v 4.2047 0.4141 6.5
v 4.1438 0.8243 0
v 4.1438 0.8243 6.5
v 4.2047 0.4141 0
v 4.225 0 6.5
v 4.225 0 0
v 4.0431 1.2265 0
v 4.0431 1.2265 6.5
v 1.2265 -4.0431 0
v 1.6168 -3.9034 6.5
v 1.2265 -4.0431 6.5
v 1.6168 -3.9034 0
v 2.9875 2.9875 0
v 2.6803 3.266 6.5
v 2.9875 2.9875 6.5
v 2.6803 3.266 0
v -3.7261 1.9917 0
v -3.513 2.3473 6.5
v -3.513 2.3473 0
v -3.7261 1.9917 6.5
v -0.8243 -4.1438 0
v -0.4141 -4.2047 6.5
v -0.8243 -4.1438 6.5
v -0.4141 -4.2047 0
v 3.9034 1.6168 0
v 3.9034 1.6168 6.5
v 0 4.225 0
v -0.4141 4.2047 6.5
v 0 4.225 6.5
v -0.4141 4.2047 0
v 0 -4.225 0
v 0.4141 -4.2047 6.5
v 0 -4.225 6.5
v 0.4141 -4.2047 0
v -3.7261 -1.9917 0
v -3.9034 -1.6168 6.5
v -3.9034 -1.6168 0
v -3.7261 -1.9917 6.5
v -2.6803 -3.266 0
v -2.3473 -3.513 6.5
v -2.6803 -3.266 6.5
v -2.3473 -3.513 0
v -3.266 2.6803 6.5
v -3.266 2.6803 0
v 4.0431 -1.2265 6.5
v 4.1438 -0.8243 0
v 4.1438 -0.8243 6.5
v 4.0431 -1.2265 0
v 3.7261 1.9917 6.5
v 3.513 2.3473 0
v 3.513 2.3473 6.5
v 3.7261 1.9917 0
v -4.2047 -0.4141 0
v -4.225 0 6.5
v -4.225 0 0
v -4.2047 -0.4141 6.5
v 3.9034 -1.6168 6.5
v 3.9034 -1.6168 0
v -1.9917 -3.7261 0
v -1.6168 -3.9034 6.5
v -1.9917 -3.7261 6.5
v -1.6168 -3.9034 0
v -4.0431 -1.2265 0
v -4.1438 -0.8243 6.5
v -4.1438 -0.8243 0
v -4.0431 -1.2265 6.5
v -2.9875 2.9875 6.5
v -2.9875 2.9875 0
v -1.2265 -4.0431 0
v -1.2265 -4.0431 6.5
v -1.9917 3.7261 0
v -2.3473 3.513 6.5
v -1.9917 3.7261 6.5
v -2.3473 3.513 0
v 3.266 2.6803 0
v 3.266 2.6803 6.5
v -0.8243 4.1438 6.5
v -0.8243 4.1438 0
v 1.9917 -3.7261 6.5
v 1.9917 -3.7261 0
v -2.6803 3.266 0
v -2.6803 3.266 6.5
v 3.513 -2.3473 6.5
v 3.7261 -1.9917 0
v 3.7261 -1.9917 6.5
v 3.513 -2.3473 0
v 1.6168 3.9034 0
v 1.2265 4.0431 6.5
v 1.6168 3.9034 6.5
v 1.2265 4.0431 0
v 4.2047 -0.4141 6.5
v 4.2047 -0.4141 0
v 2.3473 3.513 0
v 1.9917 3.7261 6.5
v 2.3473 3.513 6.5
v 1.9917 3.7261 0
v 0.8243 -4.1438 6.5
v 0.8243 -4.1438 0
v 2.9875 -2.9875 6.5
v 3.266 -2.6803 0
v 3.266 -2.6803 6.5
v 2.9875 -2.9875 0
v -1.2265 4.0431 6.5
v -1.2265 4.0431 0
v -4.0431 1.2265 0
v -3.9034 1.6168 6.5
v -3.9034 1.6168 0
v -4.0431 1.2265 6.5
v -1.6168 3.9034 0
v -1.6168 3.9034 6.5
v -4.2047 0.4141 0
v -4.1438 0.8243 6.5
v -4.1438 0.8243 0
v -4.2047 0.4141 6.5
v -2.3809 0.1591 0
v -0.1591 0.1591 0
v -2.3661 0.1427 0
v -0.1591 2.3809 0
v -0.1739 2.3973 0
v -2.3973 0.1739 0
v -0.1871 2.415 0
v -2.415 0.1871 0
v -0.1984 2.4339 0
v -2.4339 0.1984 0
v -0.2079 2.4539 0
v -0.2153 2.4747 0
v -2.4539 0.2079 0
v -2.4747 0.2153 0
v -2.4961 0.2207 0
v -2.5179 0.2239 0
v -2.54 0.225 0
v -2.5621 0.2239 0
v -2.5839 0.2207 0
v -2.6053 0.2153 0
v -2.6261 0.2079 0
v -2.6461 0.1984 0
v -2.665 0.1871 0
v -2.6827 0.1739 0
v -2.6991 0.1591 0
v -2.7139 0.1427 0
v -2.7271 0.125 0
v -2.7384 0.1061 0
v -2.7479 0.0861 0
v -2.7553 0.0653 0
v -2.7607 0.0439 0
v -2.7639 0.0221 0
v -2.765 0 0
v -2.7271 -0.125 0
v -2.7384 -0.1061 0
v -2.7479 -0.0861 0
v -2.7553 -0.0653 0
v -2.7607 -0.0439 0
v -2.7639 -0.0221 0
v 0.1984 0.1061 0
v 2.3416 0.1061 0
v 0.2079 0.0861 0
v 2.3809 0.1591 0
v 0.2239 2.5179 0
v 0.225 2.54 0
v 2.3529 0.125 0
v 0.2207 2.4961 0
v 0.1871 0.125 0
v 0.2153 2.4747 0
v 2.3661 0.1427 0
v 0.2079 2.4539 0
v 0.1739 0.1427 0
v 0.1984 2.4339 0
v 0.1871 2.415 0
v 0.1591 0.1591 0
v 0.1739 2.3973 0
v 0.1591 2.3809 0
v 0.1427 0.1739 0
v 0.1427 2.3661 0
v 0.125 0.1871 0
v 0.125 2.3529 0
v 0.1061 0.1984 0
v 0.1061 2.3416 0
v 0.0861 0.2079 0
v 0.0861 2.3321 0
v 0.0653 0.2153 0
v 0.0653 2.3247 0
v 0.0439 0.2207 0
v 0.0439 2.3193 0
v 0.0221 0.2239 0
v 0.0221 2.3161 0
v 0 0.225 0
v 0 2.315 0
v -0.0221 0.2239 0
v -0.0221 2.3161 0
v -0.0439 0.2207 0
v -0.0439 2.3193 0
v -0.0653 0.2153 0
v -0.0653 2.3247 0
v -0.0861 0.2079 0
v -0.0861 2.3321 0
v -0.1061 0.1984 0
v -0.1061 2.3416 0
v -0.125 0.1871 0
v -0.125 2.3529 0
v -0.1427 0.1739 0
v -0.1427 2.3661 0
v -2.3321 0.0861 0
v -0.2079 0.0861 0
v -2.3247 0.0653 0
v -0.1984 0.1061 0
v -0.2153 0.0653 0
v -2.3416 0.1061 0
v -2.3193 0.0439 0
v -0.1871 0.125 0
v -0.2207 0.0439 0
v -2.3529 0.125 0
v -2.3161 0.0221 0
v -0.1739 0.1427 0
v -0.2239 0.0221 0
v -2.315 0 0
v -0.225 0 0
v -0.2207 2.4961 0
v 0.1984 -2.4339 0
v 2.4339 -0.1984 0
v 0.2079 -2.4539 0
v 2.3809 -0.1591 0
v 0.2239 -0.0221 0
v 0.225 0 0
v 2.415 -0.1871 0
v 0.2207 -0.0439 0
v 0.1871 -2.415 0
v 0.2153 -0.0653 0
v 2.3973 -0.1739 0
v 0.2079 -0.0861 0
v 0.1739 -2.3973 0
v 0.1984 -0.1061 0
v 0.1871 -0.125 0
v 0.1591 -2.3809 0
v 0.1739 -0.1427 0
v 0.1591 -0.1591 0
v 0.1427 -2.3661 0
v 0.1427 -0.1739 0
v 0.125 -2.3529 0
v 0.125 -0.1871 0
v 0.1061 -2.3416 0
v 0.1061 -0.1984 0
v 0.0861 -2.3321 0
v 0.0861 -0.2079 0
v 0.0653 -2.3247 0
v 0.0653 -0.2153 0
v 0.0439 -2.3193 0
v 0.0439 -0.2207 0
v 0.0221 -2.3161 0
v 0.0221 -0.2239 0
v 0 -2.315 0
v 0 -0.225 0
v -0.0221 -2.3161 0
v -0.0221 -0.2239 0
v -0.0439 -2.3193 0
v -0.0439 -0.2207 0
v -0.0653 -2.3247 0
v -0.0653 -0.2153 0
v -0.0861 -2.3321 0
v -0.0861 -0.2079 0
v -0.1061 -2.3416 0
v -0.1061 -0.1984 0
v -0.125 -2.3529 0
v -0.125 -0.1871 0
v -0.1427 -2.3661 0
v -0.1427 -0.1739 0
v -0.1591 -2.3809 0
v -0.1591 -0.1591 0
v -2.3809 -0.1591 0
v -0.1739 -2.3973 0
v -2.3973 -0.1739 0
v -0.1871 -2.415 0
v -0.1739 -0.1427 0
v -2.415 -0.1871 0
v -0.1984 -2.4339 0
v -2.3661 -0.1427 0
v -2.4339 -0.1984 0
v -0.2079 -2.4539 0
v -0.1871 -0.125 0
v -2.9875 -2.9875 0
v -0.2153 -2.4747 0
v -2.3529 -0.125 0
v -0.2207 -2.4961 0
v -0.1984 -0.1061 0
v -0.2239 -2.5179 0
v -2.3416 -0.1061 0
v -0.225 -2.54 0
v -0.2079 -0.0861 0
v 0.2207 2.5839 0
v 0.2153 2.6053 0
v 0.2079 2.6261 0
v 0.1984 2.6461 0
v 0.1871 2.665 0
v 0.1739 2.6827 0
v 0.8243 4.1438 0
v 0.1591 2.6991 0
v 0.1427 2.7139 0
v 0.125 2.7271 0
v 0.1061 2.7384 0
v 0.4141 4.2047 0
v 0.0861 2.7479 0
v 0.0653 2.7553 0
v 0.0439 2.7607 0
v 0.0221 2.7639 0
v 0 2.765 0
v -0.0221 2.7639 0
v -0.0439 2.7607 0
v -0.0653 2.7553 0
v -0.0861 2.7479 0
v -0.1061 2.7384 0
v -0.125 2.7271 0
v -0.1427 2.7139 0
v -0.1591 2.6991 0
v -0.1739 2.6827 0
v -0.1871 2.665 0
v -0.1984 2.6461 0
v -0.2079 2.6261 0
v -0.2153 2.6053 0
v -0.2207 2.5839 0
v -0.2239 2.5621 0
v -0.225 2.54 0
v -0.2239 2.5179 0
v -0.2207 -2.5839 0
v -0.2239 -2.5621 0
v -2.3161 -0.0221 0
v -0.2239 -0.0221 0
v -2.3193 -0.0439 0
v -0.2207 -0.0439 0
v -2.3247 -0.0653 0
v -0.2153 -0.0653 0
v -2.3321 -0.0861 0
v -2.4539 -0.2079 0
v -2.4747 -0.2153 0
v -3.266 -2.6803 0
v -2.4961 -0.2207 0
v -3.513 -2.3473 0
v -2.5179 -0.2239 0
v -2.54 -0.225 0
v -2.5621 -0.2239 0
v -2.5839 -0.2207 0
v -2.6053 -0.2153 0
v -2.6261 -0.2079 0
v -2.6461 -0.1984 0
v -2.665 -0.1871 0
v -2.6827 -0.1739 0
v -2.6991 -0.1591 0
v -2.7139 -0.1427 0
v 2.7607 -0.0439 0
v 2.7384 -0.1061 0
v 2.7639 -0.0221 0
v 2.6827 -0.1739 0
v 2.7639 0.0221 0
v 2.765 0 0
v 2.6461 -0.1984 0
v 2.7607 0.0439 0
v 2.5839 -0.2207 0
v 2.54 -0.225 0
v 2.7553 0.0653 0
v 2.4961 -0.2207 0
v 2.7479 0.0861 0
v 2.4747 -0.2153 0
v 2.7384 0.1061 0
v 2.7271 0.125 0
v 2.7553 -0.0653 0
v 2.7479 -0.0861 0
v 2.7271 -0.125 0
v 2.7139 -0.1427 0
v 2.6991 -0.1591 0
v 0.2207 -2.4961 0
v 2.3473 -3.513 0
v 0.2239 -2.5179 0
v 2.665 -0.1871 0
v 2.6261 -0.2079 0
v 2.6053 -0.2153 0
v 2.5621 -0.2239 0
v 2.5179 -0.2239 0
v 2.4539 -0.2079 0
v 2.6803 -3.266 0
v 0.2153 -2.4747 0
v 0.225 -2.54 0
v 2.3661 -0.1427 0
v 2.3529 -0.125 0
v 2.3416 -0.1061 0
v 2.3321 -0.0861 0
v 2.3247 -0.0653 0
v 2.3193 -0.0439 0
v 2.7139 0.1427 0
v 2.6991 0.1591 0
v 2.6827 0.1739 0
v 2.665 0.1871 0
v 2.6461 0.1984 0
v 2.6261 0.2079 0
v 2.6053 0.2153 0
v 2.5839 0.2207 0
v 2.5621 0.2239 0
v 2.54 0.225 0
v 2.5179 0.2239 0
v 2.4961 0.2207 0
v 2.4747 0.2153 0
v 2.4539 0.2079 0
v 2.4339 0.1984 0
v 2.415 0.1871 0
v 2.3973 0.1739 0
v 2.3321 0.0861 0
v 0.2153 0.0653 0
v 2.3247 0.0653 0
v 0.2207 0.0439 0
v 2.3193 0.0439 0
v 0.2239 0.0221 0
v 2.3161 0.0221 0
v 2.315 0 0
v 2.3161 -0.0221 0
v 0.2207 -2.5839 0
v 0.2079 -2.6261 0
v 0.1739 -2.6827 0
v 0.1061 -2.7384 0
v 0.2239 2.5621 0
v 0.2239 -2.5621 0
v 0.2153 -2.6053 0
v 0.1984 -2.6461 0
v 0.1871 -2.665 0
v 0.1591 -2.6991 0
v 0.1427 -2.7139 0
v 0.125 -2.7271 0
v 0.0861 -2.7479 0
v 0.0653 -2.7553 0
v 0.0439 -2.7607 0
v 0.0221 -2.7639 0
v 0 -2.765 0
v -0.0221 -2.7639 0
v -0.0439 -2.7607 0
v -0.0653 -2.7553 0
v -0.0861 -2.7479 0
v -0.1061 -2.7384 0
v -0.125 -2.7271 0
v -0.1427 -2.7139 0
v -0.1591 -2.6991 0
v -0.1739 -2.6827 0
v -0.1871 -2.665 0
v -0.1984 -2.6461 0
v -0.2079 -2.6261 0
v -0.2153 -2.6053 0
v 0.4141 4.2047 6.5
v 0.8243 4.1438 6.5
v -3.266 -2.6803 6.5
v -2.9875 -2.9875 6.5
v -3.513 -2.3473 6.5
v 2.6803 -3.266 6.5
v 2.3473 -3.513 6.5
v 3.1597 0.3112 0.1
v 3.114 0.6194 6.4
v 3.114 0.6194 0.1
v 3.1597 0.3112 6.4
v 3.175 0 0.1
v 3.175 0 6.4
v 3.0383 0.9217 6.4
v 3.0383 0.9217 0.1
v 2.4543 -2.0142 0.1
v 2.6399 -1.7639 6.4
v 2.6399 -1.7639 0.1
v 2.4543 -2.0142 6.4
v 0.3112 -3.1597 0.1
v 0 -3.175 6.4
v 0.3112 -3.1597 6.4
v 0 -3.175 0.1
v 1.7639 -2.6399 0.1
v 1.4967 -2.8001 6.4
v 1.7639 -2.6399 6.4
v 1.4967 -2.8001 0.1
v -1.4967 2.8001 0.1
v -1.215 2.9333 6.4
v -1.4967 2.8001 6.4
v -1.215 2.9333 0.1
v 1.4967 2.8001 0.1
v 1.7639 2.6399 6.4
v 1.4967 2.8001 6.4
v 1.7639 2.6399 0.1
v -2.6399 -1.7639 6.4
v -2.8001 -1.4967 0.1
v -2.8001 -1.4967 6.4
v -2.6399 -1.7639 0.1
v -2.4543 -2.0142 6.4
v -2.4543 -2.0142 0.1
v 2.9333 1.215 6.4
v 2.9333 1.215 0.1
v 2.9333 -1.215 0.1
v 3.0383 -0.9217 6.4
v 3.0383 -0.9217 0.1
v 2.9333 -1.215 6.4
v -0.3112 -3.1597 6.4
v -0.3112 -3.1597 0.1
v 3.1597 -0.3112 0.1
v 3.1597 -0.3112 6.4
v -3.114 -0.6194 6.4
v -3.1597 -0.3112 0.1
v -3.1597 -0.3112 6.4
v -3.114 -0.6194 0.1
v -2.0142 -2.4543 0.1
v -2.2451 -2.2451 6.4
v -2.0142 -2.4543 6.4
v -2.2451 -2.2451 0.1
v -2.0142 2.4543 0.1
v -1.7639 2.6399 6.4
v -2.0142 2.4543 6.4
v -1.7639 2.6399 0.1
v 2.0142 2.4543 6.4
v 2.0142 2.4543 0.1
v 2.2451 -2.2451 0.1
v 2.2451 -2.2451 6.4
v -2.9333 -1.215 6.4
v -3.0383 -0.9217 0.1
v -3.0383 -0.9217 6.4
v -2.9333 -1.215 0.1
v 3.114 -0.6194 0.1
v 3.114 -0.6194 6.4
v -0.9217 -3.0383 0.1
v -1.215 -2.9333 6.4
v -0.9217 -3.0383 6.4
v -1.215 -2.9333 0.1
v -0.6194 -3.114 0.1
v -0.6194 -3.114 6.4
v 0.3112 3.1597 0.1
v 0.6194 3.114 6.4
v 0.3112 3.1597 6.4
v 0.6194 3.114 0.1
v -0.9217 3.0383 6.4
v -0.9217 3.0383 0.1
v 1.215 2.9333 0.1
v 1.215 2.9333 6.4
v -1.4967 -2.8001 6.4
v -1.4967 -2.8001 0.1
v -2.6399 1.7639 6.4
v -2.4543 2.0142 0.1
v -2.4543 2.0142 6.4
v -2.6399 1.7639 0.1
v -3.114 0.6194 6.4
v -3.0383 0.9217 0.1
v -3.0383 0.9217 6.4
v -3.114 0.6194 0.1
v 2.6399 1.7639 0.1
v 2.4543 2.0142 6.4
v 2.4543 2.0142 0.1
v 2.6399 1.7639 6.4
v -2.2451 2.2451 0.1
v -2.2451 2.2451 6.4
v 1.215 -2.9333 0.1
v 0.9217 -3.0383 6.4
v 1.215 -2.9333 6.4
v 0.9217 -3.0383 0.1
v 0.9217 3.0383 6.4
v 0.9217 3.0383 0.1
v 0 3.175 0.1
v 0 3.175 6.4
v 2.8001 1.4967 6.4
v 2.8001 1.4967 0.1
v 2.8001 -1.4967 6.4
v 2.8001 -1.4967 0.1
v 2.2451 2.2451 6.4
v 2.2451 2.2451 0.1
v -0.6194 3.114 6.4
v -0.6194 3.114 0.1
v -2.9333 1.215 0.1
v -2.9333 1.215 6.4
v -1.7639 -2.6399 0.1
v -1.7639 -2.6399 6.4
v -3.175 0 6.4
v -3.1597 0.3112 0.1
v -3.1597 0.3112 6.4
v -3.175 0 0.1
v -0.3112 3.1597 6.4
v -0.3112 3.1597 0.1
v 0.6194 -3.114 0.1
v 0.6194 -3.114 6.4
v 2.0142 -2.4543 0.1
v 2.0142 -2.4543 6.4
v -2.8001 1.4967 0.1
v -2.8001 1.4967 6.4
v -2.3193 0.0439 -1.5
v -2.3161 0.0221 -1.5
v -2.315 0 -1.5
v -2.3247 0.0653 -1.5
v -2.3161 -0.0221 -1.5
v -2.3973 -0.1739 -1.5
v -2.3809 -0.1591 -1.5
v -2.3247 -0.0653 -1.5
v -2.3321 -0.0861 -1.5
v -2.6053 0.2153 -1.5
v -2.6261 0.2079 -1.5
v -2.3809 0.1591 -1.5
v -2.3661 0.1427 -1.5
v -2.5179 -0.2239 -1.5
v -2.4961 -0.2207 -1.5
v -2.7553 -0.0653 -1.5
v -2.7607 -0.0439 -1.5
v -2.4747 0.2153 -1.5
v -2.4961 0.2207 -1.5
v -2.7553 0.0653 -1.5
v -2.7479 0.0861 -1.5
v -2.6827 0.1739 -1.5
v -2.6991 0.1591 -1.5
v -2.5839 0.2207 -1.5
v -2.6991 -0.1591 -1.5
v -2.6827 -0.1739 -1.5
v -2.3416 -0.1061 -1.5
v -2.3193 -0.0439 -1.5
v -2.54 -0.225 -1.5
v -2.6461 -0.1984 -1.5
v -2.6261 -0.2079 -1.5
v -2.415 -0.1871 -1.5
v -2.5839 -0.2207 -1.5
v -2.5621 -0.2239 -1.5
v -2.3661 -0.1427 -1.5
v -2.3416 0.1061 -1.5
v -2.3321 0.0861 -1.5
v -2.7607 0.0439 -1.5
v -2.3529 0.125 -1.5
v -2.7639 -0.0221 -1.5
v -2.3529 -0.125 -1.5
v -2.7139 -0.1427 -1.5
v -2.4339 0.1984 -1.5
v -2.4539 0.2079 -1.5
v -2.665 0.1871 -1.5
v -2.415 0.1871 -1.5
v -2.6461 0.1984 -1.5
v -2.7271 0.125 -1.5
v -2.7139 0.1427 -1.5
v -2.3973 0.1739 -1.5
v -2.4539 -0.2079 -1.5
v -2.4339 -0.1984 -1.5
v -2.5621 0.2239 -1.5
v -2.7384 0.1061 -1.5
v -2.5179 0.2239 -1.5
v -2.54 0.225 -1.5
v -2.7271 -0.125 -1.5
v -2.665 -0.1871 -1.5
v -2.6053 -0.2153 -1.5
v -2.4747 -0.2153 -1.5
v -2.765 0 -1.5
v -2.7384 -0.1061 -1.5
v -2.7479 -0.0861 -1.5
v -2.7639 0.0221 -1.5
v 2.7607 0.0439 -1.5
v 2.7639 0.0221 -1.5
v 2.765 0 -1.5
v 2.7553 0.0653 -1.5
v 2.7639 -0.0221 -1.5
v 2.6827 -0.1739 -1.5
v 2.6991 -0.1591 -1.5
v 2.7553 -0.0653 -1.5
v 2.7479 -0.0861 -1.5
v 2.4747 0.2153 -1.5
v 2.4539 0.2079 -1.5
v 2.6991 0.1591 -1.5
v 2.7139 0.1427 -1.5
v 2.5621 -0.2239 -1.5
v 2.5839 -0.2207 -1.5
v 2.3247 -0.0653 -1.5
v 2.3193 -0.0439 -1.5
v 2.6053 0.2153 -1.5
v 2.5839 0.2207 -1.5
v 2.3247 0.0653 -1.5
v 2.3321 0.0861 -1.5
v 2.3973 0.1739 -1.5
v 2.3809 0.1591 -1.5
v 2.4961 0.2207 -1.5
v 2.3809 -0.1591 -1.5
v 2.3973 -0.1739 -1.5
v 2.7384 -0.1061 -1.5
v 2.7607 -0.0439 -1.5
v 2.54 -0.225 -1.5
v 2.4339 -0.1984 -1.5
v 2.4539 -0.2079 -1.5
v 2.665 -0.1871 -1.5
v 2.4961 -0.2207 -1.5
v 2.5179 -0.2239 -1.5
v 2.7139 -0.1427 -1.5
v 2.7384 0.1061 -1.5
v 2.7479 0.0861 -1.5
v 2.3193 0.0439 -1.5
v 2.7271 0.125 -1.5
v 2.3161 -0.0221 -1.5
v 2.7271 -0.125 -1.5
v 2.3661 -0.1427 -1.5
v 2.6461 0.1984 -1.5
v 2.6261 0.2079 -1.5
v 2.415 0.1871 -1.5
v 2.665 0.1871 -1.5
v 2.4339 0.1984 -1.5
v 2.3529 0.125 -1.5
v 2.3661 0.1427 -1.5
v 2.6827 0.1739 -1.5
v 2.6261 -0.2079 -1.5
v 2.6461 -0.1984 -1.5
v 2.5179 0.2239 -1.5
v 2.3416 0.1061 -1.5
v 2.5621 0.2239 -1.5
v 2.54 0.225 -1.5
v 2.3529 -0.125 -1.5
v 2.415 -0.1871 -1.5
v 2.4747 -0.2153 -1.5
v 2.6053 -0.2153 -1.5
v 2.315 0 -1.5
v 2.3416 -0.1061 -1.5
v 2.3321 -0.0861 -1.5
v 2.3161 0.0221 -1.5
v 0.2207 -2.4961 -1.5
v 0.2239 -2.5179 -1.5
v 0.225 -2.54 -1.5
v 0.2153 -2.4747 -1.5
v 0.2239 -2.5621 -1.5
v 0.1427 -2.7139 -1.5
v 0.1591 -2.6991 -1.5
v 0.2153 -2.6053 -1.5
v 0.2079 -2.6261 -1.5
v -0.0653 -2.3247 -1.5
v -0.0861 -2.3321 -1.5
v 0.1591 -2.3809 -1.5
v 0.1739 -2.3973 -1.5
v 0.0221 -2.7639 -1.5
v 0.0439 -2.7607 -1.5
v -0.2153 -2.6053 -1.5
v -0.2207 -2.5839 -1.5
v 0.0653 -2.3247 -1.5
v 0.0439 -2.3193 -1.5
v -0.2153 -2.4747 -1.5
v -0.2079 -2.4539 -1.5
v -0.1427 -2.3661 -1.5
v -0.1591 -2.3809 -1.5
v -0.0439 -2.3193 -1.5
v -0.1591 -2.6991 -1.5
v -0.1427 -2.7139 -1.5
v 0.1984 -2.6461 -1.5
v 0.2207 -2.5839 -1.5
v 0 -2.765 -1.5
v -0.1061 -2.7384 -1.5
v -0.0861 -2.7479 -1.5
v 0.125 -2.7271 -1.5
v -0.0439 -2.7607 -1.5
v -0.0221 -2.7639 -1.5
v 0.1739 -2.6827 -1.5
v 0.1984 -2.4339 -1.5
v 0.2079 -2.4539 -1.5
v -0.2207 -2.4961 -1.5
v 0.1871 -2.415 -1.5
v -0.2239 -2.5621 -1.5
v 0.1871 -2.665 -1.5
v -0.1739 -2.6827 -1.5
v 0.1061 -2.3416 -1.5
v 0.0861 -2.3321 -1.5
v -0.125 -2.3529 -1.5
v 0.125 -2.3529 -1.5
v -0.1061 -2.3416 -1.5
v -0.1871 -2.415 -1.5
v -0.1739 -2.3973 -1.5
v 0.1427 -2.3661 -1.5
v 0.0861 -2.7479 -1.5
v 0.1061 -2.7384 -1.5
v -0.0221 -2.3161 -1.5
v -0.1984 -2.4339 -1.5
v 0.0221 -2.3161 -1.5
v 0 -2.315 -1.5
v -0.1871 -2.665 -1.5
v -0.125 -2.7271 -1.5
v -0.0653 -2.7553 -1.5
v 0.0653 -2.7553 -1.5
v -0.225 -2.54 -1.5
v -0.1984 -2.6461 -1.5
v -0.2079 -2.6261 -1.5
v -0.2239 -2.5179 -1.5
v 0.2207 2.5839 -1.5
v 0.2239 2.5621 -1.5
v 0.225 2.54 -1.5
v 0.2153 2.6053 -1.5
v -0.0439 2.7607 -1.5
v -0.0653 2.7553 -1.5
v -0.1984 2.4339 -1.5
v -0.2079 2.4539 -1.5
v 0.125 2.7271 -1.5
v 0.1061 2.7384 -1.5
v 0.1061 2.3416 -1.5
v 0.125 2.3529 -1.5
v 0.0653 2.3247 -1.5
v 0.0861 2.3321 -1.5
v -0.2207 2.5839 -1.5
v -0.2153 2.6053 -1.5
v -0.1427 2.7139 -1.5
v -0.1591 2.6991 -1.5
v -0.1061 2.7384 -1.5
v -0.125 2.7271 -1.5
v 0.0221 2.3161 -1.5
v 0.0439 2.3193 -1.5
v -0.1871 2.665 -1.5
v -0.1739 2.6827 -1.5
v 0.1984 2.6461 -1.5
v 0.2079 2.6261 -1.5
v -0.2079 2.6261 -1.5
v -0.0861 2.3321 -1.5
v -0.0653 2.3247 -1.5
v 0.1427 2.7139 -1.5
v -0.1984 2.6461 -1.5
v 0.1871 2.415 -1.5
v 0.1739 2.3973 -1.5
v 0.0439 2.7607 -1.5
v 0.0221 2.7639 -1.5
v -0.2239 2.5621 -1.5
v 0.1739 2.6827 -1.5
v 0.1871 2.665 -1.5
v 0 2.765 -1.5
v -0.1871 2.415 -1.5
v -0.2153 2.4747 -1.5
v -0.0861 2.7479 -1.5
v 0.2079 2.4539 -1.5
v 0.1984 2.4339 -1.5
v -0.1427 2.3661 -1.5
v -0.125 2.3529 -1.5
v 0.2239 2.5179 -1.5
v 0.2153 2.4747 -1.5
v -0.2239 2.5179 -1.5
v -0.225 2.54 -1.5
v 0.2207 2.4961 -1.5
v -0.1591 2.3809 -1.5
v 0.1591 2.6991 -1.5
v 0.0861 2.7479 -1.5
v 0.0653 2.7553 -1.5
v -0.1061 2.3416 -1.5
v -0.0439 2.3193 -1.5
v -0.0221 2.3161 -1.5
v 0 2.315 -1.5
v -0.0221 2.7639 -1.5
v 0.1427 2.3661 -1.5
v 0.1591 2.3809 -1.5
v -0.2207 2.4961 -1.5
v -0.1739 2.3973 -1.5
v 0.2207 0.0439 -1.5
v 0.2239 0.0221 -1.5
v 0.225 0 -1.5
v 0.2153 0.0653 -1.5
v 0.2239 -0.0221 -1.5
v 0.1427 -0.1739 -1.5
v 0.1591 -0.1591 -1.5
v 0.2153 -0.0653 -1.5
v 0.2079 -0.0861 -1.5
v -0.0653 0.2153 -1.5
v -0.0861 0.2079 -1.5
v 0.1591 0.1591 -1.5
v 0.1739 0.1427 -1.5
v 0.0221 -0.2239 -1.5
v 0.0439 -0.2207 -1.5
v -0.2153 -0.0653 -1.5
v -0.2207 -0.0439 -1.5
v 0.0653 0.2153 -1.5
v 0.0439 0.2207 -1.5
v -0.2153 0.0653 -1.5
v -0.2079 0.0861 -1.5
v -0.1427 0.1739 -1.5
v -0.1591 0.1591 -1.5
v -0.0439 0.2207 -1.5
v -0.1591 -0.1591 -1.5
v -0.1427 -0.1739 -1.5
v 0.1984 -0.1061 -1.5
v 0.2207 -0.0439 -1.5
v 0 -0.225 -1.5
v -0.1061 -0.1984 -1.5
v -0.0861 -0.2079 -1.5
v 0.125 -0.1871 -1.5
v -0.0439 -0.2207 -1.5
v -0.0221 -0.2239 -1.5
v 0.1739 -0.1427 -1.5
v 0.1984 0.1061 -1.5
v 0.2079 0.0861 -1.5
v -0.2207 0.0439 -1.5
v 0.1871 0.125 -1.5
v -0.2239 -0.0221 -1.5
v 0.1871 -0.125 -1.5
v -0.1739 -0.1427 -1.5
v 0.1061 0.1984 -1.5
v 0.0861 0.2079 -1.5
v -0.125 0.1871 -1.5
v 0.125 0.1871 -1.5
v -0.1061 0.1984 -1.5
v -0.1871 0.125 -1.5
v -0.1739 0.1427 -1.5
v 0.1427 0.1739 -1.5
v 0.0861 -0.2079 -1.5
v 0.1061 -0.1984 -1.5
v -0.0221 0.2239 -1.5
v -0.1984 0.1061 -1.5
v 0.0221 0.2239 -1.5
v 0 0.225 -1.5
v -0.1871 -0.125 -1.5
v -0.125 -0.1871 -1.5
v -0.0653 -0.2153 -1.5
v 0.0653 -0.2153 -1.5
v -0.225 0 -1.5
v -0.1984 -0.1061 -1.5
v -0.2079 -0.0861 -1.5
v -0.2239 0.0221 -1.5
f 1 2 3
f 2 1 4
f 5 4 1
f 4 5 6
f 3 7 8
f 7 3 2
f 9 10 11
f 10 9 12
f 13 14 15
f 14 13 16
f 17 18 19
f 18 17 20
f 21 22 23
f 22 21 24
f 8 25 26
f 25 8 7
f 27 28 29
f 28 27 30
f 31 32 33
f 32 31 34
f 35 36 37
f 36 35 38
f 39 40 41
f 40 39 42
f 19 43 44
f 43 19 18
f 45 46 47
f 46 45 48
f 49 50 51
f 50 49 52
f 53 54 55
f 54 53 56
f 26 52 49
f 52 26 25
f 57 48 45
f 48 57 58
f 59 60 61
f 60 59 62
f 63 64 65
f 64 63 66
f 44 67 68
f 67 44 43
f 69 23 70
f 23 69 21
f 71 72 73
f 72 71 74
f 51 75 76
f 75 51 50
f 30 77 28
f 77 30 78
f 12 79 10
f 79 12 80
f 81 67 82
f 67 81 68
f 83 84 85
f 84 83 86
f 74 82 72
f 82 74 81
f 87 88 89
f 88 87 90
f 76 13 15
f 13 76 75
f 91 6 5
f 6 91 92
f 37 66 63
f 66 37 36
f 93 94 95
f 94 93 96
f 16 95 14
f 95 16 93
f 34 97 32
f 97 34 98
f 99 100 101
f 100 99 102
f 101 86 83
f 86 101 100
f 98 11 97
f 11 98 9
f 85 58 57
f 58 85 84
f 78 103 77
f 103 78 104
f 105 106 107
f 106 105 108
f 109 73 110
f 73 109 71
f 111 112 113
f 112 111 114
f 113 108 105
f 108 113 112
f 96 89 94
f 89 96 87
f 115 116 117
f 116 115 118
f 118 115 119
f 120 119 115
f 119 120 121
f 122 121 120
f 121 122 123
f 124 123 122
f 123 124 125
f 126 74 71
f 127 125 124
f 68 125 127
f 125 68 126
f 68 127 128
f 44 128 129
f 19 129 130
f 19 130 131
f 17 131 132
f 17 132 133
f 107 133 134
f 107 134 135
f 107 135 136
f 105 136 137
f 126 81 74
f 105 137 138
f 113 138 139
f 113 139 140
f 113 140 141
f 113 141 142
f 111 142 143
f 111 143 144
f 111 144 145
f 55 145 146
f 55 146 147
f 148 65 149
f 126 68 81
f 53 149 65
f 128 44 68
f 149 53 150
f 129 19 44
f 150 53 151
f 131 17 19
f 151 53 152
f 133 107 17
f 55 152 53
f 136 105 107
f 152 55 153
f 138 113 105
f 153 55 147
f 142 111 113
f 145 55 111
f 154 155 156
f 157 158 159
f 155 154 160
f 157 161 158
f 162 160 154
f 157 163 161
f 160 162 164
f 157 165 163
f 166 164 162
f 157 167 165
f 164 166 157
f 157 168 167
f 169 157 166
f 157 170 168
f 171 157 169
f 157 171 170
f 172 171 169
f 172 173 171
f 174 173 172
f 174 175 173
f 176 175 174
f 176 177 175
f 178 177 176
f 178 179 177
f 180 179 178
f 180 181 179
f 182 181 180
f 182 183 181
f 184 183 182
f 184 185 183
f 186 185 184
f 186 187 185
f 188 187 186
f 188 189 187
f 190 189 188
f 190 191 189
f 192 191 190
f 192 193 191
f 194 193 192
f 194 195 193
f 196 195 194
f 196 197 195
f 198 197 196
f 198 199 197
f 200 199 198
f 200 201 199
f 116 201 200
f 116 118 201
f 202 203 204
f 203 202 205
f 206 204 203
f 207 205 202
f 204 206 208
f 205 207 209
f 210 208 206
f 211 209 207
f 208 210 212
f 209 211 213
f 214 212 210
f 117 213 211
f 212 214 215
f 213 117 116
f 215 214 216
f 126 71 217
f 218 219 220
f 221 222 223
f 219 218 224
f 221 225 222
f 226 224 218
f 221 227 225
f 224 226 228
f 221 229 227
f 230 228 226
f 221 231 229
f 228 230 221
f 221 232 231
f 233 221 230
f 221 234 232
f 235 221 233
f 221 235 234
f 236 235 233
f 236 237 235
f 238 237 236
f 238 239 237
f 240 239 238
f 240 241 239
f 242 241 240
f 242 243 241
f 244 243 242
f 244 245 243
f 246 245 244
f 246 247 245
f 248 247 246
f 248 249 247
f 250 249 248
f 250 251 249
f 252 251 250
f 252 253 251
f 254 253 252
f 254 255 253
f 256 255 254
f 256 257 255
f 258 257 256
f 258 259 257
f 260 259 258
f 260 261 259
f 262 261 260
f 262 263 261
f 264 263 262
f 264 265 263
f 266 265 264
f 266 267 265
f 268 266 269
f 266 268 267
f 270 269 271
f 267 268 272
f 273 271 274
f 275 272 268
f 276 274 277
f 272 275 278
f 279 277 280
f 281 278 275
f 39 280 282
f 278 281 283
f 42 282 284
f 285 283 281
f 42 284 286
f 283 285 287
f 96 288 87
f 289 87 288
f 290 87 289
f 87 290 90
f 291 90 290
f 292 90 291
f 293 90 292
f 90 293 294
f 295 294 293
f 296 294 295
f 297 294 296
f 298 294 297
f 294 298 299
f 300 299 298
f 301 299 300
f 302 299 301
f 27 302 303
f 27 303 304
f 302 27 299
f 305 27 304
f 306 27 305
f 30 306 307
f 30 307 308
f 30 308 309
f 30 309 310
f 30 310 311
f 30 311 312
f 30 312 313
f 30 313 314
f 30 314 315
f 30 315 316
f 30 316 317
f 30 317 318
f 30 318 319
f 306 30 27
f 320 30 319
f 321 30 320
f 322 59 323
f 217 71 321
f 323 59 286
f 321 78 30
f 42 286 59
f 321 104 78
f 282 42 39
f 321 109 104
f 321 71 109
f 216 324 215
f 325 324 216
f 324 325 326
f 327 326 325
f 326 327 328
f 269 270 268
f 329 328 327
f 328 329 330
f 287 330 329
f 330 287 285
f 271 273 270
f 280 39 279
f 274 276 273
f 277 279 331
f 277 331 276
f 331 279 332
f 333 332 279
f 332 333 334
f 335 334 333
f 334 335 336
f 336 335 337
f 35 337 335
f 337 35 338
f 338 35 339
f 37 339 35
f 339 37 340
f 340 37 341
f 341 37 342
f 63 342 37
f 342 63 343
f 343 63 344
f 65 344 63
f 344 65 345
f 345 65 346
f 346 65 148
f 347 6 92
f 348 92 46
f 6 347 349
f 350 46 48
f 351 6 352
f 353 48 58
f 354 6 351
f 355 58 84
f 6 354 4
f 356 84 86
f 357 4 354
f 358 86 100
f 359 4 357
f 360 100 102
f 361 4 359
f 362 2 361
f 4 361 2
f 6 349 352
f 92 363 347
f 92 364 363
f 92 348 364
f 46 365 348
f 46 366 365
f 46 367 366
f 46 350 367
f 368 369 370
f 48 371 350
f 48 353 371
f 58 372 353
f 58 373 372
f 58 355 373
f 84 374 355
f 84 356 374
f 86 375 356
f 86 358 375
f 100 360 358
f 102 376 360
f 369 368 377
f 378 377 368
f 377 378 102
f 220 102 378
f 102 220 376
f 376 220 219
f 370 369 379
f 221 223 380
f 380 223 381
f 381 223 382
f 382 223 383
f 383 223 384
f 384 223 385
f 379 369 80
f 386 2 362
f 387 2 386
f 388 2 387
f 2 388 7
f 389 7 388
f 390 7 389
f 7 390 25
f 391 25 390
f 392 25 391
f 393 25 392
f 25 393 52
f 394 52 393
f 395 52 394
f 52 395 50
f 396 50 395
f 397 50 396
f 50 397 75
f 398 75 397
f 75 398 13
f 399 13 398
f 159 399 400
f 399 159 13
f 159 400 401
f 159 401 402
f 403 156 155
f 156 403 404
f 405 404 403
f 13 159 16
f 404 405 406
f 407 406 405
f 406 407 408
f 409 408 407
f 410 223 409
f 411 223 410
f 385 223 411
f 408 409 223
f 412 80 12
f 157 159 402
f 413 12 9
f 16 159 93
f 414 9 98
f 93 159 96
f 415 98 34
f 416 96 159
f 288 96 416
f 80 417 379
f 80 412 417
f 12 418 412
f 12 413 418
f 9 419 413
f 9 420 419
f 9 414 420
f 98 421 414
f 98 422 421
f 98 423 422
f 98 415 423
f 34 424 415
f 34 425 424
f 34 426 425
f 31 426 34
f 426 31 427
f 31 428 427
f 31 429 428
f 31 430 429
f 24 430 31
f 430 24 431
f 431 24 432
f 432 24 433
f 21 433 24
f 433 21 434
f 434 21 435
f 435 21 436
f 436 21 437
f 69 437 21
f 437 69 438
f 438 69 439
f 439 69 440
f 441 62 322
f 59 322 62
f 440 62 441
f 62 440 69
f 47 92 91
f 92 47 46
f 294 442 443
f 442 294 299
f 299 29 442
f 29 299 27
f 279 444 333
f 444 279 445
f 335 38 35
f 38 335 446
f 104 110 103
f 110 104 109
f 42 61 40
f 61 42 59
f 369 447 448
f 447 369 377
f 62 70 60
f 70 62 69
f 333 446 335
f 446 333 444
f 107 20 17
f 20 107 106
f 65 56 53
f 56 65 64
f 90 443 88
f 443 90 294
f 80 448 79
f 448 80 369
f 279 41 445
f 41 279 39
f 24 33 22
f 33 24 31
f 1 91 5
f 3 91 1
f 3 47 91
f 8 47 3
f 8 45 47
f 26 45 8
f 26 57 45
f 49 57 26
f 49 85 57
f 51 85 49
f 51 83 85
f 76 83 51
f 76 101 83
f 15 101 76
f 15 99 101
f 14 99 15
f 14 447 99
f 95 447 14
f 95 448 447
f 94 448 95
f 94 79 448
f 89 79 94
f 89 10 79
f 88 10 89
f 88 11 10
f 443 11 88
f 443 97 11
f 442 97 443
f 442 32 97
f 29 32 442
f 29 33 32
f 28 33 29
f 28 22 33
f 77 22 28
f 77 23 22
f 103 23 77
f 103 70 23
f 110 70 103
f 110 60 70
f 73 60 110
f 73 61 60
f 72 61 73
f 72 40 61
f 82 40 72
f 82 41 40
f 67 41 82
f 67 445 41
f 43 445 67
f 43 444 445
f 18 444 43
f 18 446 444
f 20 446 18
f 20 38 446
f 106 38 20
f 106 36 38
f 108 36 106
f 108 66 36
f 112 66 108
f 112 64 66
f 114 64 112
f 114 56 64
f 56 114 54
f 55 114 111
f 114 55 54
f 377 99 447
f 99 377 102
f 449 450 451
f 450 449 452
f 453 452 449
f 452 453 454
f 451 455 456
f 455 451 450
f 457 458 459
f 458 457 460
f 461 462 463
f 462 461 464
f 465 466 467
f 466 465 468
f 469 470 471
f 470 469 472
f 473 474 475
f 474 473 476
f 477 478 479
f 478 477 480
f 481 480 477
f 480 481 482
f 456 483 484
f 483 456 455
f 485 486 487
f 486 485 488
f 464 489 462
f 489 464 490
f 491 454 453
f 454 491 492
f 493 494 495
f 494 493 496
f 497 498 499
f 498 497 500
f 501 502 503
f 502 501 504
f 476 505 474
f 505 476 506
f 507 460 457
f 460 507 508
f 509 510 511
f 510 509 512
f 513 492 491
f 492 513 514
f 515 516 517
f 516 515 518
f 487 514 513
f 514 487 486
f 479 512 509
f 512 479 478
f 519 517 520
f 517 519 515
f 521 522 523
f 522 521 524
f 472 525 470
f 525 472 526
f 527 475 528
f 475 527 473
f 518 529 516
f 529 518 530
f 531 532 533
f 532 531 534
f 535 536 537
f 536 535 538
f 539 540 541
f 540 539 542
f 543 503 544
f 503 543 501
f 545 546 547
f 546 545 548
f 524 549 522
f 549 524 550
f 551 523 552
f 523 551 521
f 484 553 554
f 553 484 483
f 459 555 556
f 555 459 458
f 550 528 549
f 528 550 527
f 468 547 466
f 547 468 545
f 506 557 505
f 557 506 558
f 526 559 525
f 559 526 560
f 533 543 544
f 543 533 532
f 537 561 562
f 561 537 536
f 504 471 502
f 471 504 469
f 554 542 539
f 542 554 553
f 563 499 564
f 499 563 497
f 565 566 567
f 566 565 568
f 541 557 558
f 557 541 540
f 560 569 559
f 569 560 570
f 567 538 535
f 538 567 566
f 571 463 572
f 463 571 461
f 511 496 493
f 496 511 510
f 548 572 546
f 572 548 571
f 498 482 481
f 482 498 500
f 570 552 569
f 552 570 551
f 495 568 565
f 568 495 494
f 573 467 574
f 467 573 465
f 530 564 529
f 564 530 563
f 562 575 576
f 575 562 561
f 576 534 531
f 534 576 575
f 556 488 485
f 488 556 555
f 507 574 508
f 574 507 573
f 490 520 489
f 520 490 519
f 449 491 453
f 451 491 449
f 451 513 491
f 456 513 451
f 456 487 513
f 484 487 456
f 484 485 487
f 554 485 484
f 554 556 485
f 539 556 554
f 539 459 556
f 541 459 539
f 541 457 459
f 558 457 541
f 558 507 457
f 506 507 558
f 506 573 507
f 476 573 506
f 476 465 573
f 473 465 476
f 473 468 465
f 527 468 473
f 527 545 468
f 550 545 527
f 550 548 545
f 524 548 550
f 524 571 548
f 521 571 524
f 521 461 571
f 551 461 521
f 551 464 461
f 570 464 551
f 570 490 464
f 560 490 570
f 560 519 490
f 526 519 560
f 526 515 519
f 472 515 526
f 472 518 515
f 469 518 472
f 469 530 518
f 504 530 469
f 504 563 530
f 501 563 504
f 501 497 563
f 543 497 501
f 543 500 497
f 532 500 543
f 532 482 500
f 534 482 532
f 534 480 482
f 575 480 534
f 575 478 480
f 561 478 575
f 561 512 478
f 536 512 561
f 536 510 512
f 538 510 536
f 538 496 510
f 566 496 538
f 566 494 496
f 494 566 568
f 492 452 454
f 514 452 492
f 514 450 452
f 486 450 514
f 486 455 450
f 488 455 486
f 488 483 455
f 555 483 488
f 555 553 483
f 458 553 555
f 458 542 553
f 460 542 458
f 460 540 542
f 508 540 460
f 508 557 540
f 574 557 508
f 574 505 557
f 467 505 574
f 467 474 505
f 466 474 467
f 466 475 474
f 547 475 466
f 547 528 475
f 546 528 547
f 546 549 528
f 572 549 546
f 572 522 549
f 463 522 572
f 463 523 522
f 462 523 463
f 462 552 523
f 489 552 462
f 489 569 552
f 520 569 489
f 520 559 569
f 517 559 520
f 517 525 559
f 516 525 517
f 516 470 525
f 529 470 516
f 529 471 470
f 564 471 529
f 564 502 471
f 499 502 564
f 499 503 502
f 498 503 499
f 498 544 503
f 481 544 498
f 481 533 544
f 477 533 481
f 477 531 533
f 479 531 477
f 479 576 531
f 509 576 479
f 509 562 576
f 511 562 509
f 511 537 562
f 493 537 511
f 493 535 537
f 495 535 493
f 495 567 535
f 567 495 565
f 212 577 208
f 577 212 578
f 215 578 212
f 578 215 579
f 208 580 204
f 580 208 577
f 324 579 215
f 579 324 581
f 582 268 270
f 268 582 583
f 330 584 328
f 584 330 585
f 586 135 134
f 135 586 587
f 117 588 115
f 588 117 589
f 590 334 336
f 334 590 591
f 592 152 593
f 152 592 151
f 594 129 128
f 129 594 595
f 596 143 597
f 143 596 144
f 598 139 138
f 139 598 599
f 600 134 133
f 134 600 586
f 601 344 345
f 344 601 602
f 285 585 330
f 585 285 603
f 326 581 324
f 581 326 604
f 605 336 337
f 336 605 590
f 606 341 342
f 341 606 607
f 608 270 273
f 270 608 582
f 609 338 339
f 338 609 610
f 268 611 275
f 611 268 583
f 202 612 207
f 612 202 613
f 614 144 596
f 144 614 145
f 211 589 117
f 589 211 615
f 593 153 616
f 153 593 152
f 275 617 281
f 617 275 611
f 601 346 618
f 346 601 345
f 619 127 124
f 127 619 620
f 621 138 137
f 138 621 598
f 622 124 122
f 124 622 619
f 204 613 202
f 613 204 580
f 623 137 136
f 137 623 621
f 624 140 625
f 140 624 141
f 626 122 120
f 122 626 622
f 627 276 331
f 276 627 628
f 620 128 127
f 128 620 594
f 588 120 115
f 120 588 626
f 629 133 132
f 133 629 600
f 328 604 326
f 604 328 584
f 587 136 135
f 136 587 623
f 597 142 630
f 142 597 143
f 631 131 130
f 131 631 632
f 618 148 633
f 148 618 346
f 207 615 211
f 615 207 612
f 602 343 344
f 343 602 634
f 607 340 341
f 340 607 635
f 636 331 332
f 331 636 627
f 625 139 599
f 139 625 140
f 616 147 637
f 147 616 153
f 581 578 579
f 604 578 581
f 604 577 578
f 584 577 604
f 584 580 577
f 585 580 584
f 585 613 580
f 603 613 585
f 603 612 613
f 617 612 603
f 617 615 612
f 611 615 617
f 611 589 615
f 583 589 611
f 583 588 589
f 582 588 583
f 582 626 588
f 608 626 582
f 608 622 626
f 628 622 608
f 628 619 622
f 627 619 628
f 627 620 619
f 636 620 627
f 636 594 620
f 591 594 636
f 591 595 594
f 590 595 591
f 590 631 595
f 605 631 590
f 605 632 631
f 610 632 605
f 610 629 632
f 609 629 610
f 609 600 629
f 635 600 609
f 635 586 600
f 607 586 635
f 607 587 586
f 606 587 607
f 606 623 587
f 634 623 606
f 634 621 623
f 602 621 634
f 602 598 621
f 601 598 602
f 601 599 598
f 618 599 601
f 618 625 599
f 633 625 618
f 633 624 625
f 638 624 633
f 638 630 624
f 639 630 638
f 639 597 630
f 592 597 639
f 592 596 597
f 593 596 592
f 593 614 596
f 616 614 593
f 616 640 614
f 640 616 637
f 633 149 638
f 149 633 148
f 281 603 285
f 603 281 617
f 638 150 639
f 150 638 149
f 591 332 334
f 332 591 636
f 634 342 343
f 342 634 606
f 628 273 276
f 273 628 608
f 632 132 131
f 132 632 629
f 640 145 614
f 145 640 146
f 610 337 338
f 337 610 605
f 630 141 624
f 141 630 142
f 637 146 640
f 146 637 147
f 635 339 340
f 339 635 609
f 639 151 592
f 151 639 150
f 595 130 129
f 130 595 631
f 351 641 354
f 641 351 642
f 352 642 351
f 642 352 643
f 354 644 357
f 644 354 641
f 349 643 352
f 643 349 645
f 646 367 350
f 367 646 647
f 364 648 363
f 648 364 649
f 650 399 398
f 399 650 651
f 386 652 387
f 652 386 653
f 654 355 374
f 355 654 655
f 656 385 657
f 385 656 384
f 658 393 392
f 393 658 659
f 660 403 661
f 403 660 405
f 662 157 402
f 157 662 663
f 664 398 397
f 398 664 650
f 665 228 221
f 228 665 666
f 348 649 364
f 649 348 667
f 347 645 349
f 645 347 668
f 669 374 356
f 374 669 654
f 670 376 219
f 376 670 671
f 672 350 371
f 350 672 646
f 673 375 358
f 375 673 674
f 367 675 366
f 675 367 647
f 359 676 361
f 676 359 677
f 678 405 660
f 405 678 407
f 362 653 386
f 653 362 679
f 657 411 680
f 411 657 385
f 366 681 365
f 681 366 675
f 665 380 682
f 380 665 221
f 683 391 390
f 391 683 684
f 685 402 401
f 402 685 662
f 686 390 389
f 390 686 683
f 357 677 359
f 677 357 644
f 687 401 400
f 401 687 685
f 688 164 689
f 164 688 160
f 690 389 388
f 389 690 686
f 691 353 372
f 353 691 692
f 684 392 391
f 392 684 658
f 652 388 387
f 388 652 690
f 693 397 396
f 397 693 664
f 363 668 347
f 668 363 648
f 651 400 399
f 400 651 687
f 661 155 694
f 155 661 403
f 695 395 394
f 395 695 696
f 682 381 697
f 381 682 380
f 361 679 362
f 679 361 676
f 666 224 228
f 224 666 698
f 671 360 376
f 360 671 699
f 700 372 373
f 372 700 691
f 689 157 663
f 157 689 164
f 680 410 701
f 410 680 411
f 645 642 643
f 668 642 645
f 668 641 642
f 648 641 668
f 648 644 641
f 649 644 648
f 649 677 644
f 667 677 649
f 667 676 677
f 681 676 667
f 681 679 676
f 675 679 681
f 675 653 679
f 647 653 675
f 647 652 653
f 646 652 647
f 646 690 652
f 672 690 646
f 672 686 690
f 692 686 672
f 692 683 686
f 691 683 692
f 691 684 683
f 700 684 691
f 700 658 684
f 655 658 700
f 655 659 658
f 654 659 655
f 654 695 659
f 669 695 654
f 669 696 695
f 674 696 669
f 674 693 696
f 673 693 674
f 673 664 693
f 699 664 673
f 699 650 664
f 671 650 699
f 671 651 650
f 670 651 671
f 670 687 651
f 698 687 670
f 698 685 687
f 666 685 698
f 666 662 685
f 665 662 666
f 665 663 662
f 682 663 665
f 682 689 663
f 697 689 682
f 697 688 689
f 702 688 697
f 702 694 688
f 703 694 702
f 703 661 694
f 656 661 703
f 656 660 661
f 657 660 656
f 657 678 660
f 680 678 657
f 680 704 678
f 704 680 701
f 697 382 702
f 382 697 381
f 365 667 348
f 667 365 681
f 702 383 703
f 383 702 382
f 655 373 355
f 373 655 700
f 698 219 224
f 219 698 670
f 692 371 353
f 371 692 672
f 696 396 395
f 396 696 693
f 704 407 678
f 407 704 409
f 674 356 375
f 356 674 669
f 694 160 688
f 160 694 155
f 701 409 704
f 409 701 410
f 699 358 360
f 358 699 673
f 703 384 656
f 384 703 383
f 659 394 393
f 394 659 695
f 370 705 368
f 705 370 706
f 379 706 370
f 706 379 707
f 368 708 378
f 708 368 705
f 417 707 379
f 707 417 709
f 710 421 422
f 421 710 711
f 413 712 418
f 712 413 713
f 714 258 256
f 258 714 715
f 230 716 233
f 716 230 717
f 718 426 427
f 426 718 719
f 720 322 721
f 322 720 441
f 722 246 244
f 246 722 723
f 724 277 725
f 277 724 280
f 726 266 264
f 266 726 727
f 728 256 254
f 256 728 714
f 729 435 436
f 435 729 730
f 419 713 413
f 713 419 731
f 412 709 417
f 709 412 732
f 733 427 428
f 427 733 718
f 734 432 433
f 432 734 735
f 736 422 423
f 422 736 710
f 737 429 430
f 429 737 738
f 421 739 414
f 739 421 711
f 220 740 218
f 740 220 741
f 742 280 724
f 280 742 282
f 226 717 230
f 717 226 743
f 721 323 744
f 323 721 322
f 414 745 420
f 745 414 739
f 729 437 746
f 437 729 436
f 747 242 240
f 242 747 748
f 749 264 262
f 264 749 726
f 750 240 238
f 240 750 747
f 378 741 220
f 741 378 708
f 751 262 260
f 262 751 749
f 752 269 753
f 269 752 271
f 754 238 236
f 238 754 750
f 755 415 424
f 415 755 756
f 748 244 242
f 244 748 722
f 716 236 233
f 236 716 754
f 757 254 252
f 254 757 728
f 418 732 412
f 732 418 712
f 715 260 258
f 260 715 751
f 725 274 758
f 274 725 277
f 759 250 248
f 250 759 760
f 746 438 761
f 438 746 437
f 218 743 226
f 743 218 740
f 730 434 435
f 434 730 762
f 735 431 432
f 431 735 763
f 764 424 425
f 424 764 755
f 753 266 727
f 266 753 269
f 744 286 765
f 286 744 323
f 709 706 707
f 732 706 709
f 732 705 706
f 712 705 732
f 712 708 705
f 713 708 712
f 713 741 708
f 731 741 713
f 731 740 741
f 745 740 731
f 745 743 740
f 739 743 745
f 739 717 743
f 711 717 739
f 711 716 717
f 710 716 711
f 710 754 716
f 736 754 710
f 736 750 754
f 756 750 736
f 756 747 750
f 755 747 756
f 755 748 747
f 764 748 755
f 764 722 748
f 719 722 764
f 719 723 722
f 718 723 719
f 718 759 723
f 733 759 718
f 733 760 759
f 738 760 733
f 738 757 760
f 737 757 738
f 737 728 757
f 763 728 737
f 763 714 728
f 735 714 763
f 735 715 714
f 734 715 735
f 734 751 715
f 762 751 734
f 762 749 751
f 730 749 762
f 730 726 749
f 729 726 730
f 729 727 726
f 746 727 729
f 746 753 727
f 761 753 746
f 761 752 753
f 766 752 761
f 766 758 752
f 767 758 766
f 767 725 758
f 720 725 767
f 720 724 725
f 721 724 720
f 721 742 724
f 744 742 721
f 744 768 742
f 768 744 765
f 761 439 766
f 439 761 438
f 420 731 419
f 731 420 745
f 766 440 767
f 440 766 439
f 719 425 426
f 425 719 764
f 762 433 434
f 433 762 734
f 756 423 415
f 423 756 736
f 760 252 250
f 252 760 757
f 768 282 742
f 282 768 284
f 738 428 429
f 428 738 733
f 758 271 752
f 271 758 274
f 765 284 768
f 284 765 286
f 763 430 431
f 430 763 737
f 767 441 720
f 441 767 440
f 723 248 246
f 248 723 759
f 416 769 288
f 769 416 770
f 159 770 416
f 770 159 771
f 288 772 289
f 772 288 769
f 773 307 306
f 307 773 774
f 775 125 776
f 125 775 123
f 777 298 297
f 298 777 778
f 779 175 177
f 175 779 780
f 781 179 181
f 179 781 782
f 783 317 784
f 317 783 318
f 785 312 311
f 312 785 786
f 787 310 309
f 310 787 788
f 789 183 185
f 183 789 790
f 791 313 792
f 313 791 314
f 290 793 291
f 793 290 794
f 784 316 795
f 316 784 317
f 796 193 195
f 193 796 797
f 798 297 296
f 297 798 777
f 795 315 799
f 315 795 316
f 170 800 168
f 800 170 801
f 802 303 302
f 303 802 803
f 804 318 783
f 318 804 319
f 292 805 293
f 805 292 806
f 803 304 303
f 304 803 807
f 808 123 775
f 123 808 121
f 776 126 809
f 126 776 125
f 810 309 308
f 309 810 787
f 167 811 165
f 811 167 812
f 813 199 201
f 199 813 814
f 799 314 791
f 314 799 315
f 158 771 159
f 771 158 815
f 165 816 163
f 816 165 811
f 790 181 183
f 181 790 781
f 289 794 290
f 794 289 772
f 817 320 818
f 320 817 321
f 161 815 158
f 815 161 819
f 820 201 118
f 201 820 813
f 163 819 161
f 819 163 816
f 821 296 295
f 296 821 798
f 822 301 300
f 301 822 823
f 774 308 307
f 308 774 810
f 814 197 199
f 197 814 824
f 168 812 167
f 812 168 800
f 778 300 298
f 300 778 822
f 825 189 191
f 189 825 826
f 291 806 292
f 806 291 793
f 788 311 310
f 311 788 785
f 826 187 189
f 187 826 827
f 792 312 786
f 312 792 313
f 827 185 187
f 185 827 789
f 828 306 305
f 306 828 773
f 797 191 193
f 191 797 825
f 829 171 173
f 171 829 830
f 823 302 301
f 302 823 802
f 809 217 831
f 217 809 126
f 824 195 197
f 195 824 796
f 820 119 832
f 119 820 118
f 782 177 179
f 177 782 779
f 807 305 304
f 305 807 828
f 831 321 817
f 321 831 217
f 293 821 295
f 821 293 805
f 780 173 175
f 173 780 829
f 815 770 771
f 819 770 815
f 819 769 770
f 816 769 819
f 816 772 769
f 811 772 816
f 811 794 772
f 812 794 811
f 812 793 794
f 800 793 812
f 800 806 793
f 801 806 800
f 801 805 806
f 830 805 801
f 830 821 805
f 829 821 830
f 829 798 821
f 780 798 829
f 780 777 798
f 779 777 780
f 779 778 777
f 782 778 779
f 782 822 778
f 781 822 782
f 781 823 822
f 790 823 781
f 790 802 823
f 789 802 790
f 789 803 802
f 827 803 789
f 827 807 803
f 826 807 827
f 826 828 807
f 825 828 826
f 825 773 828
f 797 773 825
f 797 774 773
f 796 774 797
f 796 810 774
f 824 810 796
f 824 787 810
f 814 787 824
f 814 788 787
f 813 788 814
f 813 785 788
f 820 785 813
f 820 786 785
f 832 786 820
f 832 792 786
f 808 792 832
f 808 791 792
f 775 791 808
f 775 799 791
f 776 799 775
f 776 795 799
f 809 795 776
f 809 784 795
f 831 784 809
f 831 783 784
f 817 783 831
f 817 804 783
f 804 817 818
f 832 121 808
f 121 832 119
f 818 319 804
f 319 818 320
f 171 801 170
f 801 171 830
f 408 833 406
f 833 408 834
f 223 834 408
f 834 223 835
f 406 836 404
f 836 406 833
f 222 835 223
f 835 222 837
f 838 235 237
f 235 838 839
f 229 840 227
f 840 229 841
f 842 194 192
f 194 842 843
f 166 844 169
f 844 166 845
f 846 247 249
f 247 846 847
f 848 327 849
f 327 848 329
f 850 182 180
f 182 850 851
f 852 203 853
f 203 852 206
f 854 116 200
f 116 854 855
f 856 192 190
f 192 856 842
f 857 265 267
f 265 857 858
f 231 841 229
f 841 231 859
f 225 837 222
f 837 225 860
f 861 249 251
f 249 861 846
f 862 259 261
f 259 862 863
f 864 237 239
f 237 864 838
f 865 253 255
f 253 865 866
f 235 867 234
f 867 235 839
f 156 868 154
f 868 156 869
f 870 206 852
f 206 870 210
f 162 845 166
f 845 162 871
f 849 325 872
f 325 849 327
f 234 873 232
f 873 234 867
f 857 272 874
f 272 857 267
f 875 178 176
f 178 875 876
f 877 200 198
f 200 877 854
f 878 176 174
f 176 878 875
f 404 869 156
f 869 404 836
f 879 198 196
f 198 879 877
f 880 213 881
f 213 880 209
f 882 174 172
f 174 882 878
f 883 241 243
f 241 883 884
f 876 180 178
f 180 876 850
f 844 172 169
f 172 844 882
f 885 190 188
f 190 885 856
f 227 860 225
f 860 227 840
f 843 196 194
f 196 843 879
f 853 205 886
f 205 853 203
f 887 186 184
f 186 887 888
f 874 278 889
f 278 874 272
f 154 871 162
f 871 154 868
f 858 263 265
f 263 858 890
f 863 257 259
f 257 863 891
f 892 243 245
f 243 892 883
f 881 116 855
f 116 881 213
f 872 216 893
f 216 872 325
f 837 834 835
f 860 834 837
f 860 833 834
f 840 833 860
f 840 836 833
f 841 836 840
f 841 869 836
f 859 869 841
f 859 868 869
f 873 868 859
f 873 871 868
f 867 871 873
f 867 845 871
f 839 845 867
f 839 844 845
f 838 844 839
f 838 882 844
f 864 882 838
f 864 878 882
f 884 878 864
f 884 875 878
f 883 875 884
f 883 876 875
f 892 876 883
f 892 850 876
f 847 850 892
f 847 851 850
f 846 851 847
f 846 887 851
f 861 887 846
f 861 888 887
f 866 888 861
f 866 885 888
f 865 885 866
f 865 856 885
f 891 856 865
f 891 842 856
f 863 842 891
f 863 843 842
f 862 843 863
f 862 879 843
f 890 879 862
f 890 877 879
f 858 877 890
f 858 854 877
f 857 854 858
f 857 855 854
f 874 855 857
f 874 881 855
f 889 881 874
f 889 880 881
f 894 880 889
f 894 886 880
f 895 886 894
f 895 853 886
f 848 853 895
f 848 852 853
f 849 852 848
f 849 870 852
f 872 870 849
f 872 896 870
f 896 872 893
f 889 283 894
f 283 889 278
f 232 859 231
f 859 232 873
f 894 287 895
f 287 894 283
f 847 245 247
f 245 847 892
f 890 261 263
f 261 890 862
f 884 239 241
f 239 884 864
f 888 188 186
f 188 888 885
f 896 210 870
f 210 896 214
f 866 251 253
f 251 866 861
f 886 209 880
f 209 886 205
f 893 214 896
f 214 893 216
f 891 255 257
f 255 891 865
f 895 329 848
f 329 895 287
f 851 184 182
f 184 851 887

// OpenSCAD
//
// IQ80xL photosensor
//
$fn = 64;

can_dia = 8.45;
win_dia = 6.35;
can_hgt = 6.5;

pin_dia = 0.45;
pin_len = 1.5;

pin_off = 5.08/2;

module pin_at( x, y) {
  translate( [x, y, -pin_len])
    color("gold")
    cylinder( d=pin_dia, h=pin_len);
}

module can() {
  color("grey") {
    difference() {
      cylinder( h=can_hgt, d=can_dia);
      translate( [0, 0, 0.1])
	cylinder( h=can_hgt, d=win_dia);
    }
  }
  translate( [0, 0, can_hgt-0.1])
    color("white",0.5)
    cylinder( d=win_dia, h=0.1);
}

module pkg() {
  can();
  pin_at( -2.54, 0);
  pin_at( +2.54, 0);
  pin_at( 0, -2.54);
  pin_at( 0, +2.54);
  pin_at( 0, 0);
}

pkg();
